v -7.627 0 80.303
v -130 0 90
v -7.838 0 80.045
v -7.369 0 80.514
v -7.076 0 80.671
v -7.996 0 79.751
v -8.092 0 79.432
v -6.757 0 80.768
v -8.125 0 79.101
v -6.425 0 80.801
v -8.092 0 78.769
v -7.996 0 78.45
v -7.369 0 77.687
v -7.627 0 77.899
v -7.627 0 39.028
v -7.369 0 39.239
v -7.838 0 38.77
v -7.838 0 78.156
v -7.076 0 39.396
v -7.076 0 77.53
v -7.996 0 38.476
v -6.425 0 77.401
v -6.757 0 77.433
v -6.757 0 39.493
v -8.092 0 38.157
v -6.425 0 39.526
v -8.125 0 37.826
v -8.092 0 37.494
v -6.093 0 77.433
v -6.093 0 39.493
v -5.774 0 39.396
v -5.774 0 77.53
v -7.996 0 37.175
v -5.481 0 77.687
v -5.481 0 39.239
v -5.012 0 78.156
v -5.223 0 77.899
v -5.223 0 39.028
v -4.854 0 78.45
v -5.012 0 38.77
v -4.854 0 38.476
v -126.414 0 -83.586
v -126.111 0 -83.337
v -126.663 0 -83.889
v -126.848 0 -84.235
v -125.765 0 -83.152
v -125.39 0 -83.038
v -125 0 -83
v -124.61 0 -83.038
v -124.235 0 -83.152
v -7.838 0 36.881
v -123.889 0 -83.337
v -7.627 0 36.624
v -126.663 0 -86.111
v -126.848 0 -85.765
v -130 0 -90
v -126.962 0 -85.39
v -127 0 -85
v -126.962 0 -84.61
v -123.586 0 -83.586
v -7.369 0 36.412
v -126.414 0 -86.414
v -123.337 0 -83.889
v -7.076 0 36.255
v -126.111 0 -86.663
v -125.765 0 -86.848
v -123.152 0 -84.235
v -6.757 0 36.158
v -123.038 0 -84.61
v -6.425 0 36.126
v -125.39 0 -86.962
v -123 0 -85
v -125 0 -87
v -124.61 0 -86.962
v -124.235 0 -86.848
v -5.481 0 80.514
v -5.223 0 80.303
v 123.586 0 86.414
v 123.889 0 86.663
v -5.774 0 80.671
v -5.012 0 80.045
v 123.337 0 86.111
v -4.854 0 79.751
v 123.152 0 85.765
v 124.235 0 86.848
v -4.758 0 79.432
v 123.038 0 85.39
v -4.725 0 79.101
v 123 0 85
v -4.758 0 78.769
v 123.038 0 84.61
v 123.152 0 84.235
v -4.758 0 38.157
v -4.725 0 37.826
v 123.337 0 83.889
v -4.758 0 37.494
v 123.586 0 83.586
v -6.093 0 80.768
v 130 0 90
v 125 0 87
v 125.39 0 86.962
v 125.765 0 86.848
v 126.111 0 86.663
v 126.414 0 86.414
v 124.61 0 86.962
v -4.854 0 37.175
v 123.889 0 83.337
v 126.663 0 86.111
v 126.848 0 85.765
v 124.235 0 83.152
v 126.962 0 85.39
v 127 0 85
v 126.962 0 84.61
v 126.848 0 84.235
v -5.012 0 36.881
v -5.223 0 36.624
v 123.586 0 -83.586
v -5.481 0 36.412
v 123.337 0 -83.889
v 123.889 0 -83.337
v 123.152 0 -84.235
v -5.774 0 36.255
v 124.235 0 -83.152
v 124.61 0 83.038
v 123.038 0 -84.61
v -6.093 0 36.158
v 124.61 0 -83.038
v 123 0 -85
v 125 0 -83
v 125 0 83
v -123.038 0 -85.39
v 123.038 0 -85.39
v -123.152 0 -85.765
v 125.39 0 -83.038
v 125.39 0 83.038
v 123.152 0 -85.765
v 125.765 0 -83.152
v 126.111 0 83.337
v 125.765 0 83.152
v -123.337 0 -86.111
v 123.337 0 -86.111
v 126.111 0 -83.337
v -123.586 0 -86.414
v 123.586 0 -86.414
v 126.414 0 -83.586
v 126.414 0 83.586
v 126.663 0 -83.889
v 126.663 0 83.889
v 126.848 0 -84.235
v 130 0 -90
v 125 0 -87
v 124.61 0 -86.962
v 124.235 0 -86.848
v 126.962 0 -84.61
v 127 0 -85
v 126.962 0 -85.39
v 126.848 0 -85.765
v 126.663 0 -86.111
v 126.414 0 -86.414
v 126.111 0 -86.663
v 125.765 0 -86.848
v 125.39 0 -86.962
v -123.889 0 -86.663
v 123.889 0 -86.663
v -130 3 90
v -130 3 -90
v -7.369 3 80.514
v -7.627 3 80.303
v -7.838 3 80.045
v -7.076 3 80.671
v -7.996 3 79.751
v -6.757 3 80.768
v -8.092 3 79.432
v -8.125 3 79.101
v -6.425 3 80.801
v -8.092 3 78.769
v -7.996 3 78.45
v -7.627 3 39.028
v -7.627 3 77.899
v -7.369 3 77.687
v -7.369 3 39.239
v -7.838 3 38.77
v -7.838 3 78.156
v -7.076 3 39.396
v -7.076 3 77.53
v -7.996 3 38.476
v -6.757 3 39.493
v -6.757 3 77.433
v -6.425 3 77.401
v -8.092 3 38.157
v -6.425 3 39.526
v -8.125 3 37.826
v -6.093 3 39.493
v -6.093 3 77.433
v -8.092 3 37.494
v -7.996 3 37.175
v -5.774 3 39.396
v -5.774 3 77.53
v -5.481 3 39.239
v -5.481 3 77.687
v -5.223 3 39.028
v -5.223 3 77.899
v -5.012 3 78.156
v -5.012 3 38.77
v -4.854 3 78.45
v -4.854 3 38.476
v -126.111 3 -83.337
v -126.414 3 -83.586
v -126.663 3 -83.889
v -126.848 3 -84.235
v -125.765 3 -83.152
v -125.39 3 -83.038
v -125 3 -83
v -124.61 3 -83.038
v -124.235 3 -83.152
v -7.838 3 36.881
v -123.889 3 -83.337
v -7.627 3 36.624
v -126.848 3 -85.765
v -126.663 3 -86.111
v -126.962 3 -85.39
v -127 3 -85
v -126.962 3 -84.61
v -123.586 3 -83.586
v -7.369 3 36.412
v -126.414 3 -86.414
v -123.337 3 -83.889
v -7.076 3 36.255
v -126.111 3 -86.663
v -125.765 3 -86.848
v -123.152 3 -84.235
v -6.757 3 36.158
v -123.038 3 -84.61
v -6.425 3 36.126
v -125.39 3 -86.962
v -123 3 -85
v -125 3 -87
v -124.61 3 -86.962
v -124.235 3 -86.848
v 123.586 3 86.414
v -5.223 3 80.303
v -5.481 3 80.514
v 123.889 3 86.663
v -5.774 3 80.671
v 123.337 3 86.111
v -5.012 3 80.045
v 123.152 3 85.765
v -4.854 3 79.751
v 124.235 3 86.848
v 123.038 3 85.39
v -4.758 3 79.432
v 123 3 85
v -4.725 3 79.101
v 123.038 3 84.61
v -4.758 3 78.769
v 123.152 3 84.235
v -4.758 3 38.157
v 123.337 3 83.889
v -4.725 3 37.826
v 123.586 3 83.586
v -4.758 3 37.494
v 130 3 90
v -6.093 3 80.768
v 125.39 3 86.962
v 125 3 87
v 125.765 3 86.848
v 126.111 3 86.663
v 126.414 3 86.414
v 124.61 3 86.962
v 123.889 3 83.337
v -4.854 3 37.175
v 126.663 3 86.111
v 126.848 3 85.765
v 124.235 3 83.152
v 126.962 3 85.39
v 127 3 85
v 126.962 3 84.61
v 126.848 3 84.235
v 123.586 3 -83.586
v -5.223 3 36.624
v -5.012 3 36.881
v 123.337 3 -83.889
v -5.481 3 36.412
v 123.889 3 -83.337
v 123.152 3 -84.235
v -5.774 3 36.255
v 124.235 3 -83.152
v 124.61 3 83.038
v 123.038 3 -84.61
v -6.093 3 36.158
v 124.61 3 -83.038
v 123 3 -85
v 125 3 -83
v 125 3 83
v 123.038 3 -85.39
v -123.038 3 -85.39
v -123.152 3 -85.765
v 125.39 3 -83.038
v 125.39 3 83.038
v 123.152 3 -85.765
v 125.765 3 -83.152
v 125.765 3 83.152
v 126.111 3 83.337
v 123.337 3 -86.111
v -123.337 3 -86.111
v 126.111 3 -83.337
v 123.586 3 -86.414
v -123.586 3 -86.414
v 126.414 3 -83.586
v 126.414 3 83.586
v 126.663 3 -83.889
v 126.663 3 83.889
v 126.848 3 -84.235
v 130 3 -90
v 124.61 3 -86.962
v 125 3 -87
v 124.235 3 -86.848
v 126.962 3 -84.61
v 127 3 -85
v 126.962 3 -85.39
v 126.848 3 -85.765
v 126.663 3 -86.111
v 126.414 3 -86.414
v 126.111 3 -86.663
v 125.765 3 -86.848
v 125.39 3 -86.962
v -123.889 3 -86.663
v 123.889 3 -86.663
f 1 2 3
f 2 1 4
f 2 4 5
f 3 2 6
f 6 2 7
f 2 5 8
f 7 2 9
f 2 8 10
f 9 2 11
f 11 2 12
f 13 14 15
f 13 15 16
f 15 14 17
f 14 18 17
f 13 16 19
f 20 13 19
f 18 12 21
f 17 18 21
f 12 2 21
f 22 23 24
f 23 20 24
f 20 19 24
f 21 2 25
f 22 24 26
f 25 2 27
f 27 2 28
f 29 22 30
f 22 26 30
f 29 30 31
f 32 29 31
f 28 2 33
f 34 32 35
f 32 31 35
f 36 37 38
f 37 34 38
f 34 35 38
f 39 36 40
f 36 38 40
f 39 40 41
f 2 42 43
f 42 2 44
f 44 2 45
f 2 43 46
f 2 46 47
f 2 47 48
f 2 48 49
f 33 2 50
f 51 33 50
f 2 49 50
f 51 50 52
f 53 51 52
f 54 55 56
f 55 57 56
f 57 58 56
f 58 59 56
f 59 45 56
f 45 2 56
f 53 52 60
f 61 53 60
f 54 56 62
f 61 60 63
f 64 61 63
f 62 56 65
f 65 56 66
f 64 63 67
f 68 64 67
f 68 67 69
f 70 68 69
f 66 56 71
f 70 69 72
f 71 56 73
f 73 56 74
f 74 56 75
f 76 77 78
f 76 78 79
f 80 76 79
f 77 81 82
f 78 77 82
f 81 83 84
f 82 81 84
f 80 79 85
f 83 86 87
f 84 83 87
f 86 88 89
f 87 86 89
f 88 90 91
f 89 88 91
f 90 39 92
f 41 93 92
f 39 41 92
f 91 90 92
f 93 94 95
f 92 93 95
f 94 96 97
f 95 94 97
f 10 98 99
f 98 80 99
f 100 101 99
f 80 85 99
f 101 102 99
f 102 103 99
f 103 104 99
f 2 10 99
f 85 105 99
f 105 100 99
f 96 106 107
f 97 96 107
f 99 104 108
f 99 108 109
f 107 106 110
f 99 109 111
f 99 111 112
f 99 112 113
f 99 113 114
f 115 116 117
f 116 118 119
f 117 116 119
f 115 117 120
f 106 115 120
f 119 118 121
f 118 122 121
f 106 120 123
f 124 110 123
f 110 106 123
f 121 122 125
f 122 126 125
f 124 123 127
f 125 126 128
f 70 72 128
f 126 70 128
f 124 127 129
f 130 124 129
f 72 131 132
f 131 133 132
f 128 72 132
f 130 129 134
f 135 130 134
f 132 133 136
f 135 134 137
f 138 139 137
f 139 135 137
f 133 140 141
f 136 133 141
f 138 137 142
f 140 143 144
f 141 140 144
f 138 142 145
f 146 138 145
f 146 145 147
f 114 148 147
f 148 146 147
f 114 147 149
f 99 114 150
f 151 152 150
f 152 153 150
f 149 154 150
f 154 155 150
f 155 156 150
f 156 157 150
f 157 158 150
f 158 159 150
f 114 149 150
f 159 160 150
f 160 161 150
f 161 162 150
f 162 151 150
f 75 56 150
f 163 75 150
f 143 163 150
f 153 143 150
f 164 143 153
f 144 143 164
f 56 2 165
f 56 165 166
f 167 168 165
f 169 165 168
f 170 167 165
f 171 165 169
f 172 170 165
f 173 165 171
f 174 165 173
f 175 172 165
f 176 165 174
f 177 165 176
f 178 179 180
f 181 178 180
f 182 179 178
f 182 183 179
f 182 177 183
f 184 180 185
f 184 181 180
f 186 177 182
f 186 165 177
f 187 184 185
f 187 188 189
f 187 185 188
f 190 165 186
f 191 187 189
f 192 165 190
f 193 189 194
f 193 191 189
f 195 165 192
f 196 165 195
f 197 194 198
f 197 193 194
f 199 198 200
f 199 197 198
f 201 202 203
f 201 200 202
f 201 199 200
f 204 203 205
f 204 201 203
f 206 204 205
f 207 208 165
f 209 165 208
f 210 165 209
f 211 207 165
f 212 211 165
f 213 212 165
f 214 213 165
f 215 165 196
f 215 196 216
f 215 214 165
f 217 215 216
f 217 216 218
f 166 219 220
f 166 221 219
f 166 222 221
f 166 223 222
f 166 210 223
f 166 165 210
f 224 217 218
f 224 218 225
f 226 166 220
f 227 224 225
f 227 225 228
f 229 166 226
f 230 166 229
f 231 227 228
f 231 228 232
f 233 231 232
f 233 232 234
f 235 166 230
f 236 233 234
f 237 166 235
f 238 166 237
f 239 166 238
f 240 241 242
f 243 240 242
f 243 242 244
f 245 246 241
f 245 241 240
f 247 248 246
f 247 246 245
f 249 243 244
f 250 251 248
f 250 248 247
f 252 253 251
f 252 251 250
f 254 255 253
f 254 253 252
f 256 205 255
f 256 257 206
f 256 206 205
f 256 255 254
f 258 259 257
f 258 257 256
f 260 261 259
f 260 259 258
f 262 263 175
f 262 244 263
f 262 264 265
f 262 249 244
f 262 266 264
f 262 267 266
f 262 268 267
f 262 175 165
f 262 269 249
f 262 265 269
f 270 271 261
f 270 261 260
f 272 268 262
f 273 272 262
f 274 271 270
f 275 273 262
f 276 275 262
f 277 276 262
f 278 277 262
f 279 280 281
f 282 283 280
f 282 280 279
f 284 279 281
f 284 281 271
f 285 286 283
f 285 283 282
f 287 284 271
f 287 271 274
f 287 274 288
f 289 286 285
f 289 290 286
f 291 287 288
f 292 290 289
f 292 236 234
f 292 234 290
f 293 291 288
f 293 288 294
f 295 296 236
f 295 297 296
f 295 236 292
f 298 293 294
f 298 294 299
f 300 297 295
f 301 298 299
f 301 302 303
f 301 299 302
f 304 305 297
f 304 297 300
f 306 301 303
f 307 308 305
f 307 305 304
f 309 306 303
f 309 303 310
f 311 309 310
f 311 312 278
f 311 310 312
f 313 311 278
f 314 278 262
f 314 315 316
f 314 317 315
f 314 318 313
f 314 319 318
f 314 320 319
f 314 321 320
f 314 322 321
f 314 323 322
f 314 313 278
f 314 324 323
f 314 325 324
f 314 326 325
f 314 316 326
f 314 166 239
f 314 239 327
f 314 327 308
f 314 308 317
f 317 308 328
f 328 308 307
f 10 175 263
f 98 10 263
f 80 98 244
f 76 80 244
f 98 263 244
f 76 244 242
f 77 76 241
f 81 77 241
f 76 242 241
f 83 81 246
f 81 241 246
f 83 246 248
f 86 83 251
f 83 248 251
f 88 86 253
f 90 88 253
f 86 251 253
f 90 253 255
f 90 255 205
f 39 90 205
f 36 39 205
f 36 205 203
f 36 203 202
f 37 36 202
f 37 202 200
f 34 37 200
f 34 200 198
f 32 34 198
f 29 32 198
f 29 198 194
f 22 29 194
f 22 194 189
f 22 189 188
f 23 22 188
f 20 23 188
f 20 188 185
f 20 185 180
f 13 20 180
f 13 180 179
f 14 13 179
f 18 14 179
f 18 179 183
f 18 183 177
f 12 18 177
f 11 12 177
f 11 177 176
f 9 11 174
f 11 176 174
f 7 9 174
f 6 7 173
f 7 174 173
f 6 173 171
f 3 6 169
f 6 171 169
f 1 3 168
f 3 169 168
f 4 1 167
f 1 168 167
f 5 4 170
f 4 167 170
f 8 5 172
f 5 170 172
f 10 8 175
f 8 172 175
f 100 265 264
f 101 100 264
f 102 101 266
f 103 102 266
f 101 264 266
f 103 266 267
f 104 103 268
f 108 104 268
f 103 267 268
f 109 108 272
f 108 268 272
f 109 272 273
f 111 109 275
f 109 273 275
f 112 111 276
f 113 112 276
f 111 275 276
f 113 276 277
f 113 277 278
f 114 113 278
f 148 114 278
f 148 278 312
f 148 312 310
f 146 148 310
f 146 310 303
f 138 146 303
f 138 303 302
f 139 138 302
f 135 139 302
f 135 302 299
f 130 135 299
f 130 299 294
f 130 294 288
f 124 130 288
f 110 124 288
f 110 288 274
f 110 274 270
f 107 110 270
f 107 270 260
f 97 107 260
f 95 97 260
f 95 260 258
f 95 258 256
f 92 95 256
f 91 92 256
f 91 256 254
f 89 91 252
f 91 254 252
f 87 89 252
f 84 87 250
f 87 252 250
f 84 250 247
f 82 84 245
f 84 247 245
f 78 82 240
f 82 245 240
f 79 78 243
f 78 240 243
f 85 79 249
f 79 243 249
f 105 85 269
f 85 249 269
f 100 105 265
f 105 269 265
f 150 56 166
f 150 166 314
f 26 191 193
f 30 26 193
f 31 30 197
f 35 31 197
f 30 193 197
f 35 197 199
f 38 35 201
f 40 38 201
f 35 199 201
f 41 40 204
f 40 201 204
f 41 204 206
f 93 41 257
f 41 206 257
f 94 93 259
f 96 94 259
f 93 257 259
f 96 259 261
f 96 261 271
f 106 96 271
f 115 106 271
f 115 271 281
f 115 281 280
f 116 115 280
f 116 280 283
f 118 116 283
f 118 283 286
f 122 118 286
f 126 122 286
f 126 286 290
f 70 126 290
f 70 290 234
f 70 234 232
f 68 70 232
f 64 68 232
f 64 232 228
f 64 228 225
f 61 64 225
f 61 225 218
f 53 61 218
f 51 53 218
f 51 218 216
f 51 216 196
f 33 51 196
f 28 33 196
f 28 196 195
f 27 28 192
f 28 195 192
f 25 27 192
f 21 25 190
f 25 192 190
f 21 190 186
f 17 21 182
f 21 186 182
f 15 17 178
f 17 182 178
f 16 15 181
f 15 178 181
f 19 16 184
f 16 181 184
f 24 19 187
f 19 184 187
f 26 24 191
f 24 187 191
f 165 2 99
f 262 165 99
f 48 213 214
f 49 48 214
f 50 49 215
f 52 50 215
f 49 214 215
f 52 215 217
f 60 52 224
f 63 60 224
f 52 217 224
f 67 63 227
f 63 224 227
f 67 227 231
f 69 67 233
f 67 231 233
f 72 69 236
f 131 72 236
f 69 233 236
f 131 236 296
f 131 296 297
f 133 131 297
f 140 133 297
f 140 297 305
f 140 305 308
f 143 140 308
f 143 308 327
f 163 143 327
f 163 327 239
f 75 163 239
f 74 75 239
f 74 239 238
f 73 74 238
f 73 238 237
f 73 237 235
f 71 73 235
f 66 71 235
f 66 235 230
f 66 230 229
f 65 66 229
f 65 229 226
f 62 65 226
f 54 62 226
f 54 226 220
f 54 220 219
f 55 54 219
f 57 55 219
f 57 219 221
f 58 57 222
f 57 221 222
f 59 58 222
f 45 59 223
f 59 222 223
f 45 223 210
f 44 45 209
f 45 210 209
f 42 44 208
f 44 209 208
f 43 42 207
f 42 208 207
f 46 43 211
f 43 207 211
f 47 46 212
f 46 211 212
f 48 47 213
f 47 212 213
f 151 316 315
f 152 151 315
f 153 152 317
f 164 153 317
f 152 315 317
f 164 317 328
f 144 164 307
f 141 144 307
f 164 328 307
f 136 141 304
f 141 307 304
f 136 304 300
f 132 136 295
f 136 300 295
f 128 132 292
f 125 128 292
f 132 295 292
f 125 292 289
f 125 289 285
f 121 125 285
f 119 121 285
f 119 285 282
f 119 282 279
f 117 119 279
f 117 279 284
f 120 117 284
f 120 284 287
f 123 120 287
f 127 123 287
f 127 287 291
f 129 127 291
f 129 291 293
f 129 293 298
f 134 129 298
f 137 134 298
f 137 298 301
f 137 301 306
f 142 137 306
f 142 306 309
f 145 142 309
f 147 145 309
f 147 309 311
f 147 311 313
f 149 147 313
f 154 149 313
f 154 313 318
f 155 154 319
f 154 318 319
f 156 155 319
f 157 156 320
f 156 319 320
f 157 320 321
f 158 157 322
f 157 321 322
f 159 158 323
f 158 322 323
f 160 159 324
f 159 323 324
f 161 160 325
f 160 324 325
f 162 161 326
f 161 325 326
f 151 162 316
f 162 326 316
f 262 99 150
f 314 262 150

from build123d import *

# Parameters (mm, degrees)
SKETCH1_W           = 260
SKETCH1_H           = 180
BOSS_EXTRUDE1_DEPTH = 3
SKETCH2_R           = 2
CUT_EXTRUDE1_DEPTH  = 159.142340946
SKETCH3_R           = 1.7
CUT_EXTRUDE2_DEPTH  = 10


with BuildPart() as part:
    # Sketch1 → Boss-Extrude1 (new body)
    with BuildSketch(Plane(origin=(0, 0, 0), x_dir=(1, 0, 0), z_dir=(0, 1, 0))):
        Rectangle(SKETCH1_W, SKETCH1_H)
    extrude(amount=BOSS_EXTRUDE1_DEPTH)

    # Sketch2 → Cut-Extrude1 (cut, through all)
    with BuildSketch(Plane(origin=(0, 3, 0), x_dir=(1, 0, 0), z_dir=(0, 1, 0))):
        with Locations(Location((125, -85, 0), (0, 0, 270))):
            Circle(SKETCH2_R)
        with Locations(Location((125, 85, 0), (0, 0, 90))):
            Circle(SKETCH2_R)
        with Locations(Location((-125, 85, 0), (0, 0, 270))):
            Circle(SKETCH2_R)
    extrude(amount=-CUT_EXTRUDE1_DEPTH, mode=Mode.SUBTRACT)

    # Sketch3 → Cut-Extrude2 (cut)
    with BuildSketch(Plane(origin=(0, 3, 0), x_dir=(1, 0, 0), z_dir=(0, 1, 0))):
        with Locations(Location((-6.425, -79.100611393, 0), (0, 0, 270))):
            Circle(SKETCH3_R)
        with Locations(Location((-6.425, -37.825611393, 0), (0, 0, 270))):
            Circle(SKETCH3_R)
    extrude(amount=-CUT_EXTRUDE2_DEPTH, mode=Mode.SUBTRACT)


solid = part.part
